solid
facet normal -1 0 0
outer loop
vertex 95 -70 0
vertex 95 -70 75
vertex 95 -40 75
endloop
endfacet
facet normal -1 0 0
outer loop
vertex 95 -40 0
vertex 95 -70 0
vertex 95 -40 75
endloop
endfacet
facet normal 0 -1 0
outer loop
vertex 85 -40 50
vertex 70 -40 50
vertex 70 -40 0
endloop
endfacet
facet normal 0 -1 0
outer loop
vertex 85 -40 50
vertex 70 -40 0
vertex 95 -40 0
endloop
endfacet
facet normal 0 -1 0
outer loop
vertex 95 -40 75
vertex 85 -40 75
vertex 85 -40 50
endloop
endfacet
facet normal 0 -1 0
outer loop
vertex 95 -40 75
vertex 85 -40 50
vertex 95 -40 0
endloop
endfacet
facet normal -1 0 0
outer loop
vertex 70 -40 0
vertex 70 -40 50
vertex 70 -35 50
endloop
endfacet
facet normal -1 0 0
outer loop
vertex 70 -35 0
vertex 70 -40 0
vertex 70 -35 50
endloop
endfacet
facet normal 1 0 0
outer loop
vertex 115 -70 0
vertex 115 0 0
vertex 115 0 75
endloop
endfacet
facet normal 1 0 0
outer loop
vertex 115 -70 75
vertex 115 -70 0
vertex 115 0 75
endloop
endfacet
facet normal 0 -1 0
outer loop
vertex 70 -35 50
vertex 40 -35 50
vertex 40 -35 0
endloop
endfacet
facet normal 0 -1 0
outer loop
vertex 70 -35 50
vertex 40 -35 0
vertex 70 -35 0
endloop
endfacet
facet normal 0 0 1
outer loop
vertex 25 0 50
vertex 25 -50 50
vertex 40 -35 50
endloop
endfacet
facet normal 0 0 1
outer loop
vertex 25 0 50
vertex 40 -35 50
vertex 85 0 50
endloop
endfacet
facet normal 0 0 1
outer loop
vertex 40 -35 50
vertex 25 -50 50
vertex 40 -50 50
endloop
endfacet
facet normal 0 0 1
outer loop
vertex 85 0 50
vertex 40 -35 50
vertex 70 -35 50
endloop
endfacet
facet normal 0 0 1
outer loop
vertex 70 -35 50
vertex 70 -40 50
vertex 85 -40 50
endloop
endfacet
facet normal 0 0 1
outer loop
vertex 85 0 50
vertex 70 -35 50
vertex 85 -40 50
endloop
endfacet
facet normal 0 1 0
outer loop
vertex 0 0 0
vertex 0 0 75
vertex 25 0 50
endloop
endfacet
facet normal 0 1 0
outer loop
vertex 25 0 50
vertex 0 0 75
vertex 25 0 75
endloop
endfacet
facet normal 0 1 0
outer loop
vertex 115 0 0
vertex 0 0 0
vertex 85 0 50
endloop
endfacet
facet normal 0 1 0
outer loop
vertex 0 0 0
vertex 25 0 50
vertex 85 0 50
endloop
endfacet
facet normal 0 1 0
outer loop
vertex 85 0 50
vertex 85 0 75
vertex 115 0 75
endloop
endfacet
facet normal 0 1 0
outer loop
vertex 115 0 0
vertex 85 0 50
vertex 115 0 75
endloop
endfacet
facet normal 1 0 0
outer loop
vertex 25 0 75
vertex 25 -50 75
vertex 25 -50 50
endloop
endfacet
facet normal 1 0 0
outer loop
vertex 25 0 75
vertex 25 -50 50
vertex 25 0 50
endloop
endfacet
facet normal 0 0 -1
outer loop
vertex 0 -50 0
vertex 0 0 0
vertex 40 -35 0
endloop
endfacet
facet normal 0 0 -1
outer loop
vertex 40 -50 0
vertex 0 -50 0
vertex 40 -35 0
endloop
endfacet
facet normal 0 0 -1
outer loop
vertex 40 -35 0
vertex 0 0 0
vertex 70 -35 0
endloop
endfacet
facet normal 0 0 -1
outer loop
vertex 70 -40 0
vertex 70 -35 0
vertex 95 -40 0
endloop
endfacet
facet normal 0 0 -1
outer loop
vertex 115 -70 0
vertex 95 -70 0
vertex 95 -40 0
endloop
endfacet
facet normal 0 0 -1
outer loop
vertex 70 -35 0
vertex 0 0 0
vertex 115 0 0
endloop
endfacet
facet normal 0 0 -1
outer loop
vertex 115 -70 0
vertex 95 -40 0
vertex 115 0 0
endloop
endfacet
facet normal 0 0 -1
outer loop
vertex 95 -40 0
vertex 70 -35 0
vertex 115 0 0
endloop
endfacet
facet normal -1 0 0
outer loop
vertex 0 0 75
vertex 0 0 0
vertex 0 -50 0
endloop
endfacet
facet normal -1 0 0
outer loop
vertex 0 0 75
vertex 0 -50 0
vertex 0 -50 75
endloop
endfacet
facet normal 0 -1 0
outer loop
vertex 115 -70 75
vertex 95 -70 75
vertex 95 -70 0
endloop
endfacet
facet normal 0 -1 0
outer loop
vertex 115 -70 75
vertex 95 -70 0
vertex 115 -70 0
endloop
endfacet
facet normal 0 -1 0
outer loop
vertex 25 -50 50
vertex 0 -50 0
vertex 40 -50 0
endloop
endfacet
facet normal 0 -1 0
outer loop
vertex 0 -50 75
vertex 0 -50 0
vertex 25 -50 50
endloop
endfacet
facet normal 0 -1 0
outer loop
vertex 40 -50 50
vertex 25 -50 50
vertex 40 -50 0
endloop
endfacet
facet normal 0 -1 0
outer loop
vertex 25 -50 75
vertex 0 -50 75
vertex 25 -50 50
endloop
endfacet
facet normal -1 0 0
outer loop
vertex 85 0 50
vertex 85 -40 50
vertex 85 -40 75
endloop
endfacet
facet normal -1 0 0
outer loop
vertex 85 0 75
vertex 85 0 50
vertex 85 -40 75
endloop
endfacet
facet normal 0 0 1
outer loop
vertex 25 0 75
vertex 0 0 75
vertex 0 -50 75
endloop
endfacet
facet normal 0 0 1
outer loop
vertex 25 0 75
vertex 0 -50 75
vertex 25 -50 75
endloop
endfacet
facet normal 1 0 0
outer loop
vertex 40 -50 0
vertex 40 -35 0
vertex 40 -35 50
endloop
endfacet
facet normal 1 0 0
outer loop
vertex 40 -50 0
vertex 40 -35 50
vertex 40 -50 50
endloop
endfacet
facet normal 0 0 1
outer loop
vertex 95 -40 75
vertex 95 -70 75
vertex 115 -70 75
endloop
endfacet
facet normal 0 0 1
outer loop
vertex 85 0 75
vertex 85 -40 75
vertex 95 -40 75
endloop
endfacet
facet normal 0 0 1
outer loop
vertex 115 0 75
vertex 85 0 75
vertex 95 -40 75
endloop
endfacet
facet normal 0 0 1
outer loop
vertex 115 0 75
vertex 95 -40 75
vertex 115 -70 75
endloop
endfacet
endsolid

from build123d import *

# Parameters (mm, degrees)
F0_W     = 115
F0_H     = 75
F1_DEPTH = 70
F2_W     = 60
F2_H     = 25
F3_DEPTH = 70
F4_W     = 10
F4_H     = 30
F5_DEPTH = 75
F6_W     = 30
F6_H     = 5
F6_W_2   = 15
F6_H_2   = 20
F7_DEPTH = 50
F8_W     = 25
F8_H     = 20
F9_DEPTH = 75


with BuildPart() as f1:
    # F0 (on Front) → F1 (new body)
    with BuildSketch(Plane.XZ):
        with Locations((57.5, 37.5)):
            Rectangle(F0_W, F0_H)
    extrude(amount=F1_DEPTH)

    # F2 (on face) → F3 (cut)
    with BuildSketch(Plane.XZ.offset(70)):
        with Locations((55, 62.5)):
            Rectangle(F2_W, F2_H)
    extrude(amount=-F3_DEPTH, mode=Mode.SUBTRACT)

    # F4 (on face) → F5 (cut)
    with BuildSketch(Plane.XY.offset(75)):
        with Locations((90, -55)):
            Rectangle(F4_W, F4_H)
    extrude(amount=-F5_DEPTH, mode=Mode.SUBTRACT)

    # F6 (on face) → F7 (cut)
    with BuildSketch(Plane.XY.offset(50)):
        Polygon((85, -70), (85, -40), (70, -40), (40, -40), (40, -50), (40, -70), align=None)
        with Locations((55, -37.5)):
            Rectangle(F6_W, F6_H)
        with Locations((32.5, -60)):
            Rectangle(F6_W_2, F6_H_2)
    extrude(amount=-F7_DEPTH, mode=Mode.SUBTRACT)

    # F8 (on face) → F9 (cut)
    with BuildSketch(Plane.XY.offset(75)):
        with Locations((12.5, -60)):
            Rectangle(F8_W, F8_H)
    extrude(amount=-F9_DEPTH, mode=Mode.SUBTRACT)


solid = f1.part
